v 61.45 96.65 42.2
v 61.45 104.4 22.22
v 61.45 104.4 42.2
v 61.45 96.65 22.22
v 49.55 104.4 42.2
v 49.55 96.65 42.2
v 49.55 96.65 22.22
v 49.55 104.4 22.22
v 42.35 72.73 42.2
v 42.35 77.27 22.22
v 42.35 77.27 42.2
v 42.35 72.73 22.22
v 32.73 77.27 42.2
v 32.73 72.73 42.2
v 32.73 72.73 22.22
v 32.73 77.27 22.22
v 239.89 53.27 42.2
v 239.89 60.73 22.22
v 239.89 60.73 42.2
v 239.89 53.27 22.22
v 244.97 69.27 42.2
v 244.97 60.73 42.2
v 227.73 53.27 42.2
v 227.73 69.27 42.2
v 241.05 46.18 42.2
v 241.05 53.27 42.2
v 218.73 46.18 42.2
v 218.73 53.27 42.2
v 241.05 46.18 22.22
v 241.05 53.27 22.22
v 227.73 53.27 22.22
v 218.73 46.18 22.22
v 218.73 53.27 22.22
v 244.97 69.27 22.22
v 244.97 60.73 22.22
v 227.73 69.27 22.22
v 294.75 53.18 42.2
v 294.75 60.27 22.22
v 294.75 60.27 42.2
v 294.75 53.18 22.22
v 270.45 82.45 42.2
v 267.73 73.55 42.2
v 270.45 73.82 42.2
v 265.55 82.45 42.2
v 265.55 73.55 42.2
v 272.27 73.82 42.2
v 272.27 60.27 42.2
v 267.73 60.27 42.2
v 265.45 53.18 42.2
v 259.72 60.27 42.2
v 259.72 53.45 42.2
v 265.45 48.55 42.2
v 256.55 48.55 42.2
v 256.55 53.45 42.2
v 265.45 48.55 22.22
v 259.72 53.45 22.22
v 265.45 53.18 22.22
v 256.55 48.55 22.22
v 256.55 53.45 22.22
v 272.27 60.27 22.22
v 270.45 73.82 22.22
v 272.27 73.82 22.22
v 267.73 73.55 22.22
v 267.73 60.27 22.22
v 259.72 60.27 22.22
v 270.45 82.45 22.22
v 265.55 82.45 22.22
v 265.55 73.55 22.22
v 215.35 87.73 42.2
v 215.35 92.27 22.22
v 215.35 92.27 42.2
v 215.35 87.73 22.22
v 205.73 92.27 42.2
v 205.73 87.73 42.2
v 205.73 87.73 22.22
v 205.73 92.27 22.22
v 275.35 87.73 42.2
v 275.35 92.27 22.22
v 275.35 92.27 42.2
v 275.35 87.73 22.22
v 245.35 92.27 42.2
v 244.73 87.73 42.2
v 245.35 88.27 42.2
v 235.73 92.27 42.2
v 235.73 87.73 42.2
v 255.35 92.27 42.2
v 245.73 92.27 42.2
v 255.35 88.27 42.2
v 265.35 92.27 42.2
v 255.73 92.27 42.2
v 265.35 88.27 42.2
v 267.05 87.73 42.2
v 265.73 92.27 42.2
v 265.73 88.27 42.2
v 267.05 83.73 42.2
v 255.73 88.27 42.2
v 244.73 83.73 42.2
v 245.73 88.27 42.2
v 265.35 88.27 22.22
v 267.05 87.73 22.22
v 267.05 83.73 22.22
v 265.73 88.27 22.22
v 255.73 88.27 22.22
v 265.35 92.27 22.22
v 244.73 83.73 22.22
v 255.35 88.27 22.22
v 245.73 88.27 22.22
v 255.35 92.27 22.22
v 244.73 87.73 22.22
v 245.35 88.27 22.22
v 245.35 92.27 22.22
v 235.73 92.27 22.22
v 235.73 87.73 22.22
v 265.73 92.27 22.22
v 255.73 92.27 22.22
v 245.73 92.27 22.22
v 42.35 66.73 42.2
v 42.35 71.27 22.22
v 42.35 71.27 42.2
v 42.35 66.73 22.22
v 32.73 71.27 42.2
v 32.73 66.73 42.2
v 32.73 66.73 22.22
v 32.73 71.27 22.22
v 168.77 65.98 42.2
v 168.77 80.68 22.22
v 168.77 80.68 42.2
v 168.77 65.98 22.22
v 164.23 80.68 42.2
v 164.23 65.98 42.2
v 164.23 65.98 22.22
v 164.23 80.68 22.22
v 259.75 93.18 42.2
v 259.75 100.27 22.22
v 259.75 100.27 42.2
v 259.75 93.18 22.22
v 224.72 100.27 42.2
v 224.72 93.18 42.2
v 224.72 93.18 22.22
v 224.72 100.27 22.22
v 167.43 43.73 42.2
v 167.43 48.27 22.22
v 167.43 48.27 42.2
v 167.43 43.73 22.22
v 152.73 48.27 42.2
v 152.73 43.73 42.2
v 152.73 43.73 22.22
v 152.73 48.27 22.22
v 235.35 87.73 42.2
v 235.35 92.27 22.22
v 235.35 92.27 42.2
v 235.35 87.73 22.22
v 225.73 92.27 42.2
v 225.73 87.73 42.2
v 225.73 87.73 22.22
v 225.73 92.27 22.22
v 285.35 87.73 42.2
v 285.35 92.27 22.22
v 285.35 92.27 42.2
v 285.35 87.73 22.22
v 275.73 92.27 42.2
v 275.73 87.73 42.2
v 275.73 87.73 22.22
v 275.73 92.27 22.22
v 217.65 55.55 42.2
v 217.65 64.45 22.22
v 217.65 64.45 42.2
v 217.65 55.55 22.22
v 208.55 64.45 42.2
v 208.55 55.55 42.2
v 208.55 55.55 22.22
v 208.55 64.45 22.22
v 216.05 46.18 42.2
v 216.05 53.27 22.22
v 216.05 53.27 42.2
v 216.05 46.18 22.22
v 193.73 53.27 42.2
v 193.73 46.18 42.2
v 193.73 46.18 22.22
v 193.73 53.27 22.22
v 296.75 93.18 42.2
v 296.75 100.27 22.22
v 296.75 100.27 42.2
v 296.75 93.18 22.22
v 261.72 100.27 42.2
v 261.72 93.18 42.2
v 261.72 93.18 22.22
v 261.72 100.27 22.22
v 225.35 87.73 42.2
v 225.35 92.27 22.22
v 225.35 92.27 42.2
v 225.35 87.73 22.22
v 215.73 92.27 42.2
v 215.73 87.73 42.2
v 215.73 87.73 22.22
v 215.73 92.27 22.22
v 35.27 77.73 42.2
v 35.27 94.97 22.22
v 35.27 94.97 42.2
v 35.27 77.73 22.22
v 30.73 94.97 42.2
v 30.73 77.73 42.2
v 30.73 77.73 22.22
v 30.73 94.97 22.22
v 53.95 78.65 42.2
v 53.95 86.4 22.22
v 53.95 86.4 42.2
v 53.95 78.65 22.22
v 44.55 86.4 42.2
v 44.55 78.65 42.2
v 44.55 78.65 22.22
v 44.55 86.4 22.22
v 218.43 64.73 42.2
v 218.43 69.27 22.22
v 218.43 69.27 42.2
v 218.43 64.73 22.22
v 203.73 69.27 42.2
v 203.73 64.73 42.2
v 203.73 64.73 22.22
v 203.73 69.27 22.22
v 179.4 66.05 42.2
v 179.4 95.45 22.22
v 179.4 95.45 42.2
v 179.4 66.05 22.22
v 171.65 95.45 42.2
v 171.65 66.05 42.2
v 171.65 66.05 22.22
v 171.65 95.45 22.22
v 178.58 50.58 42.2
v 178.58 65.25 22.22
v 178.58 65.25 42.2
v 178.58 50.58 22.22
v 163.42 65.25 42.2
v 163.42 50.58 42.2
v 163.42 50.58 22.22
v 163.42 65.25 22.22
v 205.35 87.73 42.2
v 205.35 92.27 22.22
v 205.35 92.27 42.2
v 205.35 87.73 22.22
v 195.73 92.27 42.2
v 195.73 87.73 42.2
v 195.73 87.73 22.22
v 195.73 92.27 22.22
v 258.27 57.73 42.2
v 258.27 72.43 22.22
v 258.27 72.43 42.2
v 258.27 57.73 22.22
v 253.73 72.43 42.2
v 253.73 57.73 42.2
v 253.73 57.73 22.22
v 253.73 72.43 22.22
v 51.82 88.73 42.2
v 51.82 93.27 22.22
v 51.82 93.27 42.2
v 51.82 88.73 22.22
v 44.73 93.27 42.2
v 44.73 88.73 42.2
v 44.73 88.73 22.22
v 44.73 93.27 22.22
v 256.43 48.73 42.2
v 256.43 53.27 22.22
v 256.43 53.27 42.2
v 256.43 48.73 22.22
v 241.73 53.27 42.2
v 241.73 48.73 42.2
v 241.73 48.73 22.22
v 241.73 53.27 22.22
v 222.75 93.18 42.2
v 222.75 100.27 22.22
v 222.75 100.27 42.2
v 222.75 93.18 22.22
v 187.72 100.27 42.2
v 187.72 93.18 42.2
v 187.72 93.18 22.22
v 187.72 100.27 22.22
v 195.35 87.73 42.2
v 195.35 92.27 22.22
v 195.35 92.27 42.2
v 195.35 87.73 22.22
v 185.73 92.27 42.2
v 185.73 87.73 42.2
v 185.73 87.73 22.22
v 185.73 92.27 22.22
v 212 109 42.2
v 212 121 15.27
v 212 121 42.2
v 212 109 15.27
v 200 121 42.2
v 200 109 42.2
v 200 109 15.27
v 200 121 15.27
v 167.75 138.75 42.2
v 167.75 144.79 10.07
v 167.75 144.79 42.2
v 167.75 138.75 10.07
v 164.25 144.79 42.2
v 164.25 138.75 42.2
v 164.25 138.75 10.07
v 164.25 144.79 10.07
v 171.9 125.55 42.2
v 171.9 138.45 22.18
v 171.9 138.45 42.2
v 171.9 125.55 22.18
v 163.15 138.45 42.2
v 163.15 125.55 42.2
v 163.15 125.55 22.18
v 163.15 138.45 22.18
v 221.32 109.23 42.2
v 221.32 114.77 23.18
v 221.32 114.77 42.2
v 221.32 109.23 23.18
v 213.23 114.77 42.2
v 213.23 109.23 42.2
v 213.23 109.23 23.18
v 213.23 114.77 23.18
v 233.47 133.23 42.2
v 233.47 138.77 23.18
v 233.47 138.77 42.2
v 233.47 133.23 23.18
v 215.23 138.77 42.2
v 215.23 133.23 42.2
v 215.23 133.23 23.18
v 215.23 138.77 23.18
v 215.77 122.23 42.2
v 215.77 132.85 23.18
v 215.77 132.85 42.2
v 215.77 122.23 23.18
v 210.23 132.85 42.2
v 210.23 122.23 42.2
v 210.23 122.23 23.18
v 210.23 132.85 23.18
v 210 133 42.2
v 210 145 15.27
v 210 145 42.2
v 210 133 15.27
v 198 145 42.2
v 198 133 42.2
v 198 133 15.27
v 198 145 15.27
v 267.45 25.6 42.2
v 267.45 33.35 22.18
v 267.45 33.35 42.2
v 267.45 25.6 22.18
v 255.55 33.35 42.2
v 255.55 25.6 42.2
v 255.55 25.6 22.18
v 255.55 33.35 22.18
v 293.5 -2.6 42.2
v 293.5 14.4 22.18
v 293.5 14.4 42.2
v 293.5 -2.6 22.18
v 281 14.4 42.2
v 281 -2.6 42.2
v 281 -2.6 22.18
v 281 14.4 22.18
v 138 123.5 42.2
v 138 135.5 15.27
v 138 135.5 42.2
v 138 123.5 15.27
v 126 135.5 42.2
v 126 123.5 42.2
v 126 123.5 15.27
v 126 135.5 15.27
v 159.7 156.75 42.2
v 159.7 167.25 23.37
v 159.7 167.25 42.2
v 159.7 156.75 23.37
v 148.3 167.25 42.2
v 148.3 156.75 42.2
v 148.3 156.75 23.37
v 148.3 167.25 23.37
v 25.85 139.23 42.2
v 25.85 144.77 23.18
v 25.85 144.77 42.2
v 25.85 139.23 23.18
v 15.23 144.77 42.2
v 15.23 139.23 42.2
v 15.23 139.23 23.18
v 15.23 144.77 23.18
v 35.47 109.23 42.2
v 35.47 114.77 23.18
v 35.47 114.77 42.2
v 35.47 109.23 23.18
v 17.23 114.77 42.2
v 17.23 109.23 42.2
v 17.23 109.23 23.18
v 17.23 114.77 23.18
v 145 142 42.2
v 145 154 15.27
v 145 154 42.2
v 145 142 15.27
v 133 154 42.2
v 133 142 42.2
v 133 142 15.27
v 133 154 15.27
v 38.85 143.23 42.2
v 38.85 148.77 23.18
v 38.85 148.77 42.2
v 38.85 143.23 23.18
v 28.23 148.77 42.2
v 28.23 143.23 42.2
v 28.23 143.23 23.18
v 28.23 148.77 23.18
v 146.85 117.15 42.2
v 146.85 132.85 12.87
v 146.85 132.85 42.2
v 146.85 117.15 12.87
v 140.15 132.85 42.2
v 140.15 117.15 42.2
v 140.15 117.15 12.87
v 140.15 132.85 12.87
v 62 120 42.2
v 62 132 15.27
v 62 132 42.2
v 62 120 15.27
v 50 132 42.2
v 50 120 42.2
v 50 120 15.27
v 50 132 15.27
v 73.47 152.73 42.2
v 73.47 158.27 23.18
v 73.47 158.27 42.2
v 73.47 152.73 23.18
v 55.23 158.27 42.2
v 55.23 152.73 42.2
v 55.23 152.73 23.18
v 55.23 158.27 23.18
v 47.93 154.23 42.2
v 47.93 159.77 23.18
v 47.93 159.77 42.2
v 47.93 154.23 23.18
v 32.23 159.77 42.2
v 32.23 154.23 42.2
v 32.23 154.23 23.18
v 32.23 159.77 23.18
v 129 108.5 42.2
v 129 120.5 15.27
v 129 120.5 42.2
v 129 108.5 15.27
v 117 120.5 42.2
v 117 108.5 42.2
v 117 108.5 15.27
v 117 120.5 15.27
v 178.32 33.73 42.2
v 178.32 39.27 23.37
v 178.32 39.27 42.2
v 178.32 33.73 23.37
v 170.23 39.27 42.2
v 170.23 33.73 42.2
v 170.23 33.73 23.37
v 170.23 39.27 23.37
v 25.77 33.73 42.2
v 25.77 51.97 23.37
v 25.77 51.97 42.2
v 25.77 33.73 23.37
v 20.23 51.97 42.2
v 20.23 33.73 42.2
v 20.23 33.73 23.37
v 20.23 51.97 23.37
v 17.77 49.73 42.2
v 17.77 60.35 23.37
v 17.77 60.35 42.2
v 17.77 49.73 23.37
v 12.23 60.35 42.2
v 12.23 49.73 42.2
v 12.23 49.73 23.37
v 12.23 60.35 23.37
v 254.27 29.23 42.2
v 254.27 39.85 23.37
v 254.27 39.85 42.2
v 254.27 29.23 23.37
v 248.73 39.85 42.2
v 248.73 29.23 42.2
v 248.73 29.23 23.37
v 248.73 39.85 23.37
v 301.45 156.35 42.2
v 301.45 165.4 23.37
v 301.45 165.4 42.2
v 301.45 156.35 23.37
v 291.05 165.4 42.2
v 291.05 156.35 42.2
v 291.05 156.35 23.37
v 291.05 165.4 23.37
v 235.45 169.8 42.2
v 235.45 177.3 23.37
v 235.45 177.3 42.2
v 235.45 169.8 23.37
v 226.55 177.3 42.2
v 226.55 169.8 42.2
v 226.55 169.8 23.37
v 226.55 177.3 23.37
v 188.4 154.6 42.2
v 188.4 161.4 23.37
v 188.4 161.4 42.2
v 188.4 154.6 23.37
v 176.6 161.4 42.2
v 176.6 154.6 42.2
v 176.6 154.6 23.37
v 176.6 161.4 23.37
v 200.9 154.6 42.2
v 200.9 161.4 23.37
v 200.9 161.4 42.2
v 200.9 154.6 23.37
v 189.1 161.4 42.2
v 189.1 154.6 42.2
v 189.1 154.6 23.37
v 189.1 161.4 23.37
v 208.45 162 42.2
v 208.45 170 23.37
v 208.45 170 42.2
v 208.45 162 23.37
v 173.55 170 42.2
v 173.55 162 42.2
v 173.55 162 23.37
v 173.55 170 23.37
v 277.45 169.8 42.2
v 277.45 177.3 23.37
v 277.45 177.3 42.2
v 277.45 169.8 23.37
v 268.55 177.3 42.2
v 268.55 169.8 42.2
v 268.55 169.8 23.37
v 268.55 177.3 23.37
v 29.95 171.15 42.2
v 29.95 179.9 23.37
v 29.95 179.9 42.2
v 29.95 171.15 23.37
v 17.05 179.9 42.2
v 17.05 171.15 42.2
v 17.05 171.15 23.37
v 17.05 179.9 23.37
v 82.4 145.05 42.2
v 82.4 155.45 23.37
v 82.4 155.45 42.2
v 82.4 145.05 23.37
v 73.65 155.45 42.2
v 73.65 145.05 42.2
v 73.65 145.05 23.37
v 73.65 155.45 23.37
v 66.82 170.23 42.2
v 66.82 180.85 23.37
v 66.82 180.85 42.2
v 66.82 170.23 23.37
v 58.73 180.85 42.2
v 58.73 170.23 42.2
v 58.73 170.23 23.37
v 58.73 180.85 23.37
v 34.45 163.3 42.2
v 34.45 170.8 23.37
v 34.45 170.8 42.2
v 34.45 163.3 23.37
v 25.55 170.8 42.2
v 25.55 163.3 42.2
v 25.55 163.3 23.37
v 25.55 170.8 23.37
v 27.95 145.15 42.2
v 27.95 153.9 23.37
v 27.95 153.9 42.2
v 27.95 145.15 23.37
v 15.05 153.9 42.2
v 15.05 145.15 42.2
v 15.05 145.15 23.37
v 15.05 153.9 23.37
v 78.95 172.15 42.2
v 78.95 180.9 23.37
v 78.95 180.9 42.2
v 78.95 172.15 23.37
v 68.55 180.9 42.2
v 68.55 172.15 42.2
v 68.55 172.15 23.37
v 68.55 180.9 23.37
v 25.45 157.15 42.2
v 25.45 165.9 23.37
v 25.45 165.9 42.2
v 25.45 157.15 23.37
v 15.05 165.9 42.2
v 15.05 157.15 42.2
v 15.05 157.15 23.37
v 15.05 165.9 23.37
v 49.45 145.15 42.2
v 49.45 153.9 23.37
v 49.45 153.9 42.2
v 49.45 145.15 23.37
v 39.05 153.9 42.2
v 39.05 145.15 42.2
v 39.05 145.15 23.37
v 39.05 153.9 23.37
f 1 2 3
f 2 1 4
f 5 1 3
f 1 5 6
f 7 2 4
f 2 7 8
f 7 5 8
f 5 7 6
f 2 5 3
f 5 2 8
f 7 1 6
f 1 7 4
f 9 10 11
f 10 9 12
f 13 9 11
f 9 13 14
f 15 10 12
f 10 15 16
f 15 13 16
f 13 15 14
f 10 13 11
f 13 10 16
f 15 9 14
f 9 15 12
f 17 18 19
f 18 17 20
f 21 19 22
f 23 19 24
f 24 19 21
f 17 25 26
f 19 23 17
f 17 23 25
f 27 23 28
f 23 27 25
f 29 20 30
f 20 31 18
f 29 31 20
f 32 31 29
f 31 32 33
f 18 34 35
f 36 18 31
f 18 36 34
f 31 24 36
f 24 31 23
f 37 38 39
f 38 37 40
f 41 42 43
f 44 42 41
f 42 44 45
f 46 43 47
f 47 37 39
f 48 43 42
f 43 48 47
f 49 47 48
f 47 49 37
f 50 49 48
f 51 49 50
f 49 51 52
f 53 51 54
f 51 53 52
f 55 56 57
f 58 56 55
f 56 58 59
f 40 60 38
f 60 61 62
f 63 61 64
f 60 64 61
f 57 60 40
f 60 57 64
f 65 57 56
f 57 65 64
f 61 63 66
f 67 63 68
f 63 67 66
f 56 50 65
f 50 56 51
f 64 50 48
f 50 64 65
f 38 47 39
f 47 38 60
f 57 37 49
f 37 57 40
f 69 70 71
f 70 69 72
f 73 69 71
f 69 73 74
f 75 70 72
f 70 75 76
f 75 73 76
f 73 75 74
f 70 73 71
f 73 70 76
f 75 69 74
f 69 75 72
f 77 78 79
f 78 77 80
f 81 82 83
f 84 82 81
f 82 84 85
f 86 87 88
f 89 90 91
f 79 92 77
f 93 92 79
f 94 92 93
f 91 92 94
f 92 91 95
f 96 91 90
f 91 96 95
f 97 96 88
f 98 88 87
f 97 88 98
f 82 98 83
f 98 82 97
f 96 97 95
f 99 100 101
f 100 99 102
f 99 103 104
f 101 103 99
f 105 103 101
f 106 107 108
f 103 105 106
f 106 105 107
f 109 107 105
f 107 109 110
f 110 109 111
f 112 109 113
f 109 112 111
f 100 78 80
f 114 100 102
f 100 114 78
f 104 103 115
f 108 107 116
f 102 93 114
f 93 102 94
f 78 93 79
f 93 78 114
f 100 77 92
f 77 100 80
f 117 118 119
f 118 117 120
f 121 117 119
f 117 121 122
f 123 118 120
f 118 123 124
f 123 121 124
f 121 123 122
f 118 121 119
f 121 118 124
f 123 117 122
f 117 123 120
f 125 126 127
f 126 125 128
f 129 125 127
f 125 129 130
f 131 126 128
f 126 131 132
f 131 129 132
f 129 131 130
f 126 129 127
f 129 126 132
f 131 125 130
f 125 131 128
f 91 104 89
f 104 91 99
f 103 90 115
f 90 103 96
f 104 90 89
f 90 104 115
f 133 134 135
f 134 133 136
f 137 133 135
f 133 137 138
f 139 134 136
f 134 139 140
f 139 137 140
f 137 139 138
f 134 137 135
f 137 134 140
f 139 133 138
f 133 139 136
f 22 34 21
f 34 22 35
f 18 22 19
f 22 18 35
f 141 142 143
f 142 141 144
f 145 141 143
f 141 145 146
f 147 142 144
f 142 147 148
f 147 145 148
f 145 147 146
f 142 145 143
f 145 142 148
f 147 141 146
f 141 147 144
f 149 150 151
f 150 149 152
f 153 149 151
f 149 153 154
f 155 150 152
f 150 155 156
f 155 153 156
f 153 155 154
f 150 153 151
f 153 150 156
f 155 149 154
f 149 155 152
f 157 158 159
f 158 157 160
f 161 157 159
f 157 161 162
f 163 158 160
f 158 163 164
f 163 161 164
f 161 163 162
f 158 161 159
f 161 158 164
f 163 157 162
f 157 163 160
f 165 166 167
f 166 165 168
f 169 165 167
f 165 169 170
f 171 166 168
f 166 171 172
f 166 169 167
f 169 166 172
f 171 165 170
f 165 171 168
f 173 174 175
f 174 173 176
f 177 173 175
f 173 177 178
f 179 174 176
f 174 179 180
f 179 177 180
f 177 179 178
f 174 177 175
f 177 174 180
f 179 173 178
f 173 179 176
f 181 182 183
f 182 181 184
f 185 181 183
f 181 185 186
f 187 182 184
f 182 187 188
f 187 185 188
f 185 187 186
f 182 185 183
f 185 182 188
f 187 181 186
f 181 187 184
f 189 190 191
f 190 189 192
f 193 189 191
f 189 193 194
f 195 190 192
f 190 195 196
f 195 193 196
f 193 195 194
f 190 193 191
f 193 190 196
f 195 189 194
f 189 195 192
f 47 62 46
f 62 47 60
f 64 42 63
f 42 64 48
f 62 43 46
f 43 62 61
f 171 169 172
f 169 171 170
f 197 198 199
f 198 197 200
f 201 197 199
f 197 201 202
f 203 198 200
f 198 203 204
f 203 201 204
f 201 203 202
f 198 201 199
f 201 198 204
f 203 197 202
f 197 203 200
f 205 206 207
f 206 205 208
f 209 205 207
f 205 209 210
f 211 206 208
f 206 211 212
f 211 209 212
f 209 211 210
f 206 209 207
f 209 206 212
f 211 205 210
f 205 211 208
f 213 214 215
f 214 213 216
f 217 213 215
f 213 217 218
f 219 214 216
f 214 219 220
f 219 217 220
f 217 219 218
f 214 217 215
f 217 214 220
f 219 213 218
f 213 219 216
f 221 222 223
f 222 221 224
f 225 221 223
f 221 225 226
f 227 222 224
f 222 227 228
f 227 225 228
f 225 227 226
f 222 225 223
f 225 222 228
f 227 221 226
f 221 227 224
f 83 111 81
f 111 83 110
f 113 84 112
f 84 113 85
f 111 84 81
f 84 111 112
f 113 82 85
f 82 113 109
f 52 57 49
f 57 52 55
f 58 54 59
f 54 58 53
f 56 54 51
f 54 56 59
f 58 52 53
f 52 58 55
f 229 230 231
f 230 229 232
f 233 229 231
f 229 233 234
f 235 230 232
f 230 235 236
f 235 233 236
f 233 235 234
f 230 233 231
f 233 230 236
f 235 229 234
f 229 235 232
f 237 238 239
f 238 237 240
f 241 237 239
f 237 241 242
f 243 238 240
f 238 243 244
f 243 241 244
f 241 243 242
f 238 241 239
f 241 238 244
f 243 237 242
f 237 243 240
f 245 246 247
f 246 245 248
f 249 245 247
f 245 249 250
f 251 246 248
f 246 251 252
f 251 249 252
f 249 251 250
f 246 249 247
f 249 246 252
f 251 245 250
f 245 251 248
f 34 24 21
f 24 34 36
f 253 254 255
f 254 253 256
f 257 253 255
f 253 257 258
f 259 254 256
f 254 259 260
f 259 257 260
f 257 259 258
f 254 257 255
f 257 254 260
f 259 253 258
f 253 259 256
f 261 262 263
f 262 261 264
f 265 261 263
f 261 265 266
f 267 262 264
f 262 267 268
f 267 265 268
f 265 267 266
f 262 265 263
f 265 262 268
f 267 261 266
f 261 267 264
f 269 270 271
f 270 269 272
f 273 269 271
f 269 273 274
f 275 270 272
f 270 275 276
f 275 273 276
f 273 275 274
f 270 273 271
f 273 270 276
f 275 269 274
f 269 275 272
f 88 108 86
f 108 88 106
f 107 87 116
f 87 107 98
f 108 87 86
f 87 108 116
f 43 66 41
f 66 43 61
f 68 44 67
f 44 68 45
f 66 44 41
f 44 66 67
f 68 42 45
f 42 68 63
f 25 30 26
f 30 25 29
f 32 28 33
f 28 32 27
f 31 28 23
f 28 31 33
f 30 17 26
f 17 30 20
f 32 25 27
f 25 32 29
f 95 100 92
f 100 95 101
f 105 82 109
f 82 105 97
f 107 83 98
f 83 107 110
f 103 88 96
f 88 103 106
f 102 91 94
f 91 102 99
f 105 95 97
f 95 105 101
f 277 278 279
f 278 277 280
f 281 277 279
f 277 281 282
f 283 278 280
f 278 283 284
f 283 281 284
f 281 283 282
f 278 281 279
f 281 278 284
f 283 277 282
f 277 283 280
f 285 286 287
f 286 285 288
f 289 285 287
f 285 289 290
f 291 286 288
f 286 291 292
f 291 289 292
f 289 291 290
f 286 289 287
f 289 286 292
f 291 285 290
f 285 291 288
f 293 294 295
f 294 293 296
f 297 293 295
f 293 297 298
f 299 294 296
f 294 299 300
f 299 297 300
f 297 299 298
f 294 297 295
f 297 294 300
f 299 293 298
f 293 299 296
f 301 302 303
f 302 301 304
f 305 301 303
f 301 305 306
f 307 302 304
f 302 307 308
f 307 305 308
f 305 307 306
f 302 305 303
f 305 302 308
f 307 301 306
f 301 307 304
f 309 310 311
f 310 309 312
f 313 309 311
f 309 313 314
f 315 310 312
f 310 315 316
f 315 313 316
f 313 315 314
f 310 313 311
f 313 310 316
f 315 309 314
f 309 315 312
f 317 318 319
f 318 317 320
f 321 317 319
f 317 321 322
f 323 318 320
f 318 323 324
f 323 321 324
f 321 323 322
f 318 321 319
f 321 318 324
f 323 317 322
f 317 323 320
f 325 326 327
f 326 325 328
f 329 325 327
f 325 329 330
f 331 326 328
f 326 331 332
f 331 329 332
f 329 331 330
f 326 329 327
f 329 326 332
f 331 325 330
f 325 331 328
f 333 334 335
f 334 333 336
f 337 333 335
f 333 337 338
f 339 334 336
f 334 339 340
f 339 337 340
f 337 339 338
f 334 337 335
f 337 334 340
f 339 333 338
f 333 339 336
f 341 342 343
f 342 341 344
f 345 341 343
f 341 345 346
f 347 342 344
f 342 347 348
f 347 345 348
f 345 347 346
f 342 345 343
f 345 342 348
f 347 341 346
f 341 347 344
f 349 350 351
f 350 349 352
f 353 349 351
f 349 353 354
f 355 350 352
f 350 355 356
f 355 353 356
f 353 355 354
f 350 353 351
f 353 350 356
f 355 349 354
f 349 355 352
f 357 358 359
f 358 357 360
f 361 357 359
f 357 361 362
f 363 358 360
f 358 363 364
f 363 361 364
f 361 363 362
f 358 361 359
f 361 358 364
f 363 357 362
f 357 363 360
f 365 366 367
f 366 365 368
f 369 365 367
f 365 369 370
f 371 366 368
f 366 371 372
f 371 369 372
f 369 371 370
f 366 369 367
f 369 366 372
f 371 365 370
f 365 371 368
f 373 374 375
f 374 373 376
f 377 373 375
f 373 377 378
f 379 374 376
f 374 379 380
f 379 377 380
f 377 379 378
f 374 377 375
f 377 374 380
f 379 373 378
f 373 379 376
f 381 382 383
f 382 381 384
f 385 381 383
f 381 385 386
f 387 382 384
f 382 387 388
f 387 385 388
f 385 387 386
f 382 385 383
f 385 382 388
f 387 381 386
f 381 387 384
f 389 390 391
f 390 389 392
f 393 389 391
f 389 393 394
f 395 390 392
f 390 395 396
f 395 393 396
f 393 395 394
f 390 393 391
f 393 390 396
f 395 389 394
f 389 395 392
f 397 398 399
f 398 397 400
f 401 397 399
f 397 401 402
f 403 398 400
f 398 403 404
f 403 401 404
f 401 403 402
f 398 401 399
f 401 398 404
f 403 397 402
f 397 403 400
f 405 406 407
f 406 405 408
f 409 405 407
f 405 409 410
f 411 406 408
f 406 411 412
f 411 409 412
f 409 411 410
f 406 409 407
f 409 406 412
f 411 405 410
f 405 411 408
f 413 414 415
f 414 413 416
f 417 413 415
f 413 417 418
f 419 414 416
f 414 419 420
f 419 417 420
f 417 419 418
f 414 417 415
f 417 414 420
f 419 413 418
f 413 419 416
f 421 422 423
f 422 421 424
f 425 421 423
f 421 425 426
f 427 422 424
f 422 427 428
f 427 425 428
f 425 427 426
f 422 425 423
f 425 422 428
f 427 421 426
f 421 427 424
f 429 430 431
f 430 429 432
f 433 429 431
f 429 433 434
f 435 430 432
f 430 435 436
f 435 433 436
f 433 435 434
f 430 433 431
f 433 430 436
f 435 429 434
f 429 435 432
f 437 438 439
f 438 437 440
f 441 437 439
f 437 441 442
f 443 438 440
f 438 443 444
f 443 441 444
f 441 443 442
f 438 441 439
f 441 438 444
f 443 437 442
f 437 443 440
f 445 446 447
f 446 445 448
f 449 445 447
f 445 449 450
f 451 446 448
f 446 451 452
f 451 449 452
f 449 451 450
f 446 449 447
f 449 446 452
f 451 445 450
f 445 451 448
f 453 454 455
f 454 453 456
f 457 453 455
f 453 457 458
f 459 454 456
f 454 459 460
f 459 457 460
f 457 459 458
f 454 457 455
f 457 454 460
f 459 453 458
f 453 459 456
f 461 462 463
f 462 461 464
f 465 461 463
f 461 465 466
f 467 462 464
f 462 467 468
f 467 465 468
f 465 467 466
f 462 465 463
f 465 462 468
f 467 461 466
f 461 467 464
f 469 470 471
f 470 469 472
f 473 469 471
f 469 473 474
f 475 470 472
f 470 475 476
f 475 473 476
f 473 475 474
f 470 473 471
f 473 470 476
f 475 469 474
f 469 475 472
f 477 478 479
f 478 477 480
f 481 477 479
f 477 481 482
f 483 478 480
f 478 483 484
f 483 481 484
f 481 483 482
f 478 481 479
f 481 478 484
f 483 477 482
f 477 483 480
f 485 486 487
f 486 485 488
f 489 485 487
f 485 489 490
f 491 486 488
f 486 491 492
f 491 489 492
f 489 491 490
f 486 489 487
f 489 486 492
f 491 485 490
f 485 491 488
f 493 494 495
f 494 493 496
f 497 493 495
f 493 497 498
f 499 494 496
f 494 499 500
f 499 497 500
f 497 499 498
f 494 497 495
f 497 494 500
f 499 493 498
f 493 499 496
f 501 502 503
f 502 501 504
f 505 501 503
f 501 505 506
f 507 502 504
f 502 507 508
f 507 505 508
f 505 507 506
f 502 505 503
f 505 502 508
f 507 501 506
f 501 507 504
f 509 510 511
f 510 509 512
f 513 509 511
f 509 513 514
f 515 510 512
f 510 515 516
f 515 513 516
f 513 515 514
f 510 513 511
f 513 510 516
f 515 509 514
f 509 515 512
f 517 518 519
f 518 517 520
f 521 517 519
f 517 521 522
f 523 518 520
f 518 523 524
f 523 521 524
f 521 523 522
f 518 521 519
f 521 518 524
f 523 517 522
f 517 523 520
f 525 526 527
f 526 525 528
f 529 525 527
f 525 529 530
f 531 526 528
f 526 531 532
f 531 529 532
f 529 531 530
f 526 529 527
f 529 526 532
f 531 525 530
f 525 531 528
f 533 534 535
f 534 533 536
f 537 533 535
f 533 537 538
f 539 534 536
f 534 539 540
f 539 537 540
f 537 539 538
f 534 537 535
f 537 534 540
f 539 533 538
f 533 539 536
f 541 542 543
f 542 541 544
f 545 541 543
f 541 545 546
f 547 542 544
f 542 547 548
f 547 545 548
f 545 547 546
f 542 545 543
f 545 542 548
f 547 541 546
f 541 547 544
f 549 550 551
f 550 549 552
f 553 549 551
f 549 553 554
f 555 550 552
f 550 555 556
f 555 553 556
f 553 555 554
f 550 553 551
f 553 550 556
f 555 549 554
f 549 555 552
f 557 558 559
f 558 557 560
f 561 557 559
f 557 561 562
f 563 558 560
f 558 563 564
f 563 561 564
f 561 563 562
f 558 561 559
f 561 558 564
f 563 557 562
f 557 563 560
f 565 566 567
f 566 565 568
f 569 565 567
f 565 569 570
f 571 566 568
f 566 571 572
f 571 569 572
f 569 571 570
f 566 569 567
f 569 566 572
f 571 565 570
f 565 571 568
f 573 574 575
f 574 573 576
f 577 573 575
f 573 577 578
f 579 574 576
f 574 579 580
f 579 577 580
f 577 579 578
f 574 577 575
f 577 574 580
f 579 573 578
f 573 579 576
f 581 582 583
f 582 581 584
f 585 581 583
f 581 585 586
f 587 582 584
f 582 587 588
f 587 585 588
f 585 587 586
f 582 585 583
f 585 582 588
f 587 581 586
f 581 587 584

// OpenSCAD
// Diagnostic volumes only. Not printable parts or approved cable mates.
part="service";
module box(b){translate([b[0],b[1],b[2]])cube([b[3]-b[0],b[4]-b[1],b[5]-b[2]]);}
service_boxes=[[49.55, 96.65, 22.220000000000002, 61.45, 104.4, 42.2], [32.73, 72.73, 22.220000000000002, 42.35, 77.27000000000001, 42.2], [227.73, 52.73, 22.220000000000002, 239.89, 57.27, 42.2], [259.72, 53.18, 22.220000000000002, 294.75, 60.27, 42.2], [205.73, 87.72999999999999, 22.220000000000002, 215.35, 92.27000000000001, 42.2], [265.73, 87.72999999999999, 22.220000000000002, 275.35, 92.27000000000001, 42.2], [32.73, 66.73, 22.220000000000002, 42.35, 71.27, 42.2], [164.23, 65.98, 22.220000000000002, 168.77, 80.68, 42.2], [255.73000000000002, 87.72999999999999, 22.220000000000002, 265.35, 92.27000000000001, 42.2], [224.72, 93.18, 22.220000000000002, 259.75, 100.27000000000001, 42.2], [227.73, 60.73, 22.220000000000002, 244.97, 65.27, 42.2], [152.73, 43.73, 22.220000000000002, 167.43, 48.27, 42.2], [225.73, 87.72999999999999, 22.220000000000002, 235.35, 92.27000000000001, 42.2], [275.73, 87.72999999999999, 22.220000000000002, 285.35, 92.27000000000001, 42.2], [212.75, 55.55, 22.220000000000002, 217.64999999999998, 64.45, 42.2], [193.73, 46.18, 22.220000000000002, 216.05, 53.27, 42.2], [261.72, 93.18, 22.220000000000002, 296.75, 100.27000000000001, 42.2], [215.73, 87.72999999999999, 22.220000000000002, 225.35, 92.27000000000001, 42.2], [267.73, 66.73, 22.220000000000002, 272.27, 73.82, 42.2], [208.55, 55.55, 22.220000000000002, 213.45, 64.45, 42.2], [30.73, 77.72999999999999, 22.220000000000002, 35.27, 94.97, 42.2], [44.55, 78.65, 22.220000000000002, 53.95, 86.4, 42.2], [203.73, 64.73, 22.220000000000002, 218.43, 69.27, 42.2], [267.73, 60.18, 22.220000000000002, 272.27, 67.27, 42.2], [171.65, 66.05, 22.220000000000002, 179.4, 95.45, 42.2], [235.73, 87.72999999999999, 22.220000000000002, 245.35, 92.27000000000001, 42.2], [256.55, 48.55, 22.220000000000002, 265.45, 53.45, 42.2], [163.42, 50.58, 22.220000000000002, 178.58, 65.25, 42.2], [195.73, 87.72999999999999, 22.220000000000002, 205.35, 92.27000000000001, 42.2], [253.73, 57.73, 22.220000000000002, 258.27, 72.43, 42.2], [227.73, 64.73, 22.220000000000002, 244.97, 69.27, 42.2], [44.73, 88.72999999999999, 22.220000000000002, 51.82, 93.27000000000001, 42.2], [241.73, 48.73, 22.220000000000002, 256.43, 53.27, 42.2], [187.72, 93.18, 22.220000000000002, 222.75, 100.27000000000001, 42.2], [245.73, 87.72999999999999, 22.220000000000002, 255.35, 92.27000000000001, 42.2], [227.73, 56.73, 22.220000000000002, 239.89, 61.27, 42.2], [265.55, 73.55, 22.220000000000002, 270.45, 82.45, 42.2], [218.73, 46.18, 22.220000000000002, 241.05, 53.27, 42.2], [244.73, 83.72999999999999, 22.220000000000002, 267.05, 88.27000000000001, 42.2], [185.73, 87.72999999999999, 22.220000000000002, 195.35, 92.27000000000001, 42.2], [200.0, 109.0, 15.27, 212.0, 121.0, 42.2], [164.25, 138.75, 10.069999999999999, 167.75, 144.79, 42.2], [163.15, 125.55, 22.180000000000003, 171.9, 138.45, 42.2], [213.23, 109.23, 23.180000000000003, 221.32, 114.77, 42.2], [215.23, 133.23000000000002, 23.180000000000003, 233.47, 138.77, 42.2], [210.23, 122.22999999999999, 23.180000000000003, 215.77, 132.85, 42.2], [198.0, 133.0, 15.27, 210.0, 145.0, 42.2], [255.55, 25.599999999999994, 22.180000000000003, 267.45, 33.35, 42.2], [281.0, -2.600000000000003, 22.180000000000003, 293.5, 14.4, 42.2], [126.0, 123.5, 15.27, 138.0, 135.5, 42.2], [148.3, 156.75, 23.37, 159.7, 167.25, 42.2], [15.230000000000004, 139.23, 23.180000000000003, 25.849999999999994, 144.77, 42.2], [17.230000000000004, 109.23, 23.180000000000003, 35.47, 114.77, 42.2], [133.0, 142.0, 15.27, 145.0, 154.0, 42.2], [28.230000000000004, 143.23, 23.180000000000003, 38.849999999999994, 148.77, 42.2], [140.15, 117.15, 12.87, 146.85, 132.85, 42.2], [50.0, 120.0, 15.27, 62.0, 132.0, 42.2], [55.22999999999999, 152.73, 23.180000000000003, 73.47, 158.27, 42.2], [32.230000000000004, 154.23, 23.180000000000003, 47.93000000000001, 159.77, 42.2], [117.0, 108.5, 15.27, 129.0, 120.5, 42.2], [170.23, 33.730000000000004, 23.37, 178.32, 39.269999999999996, 42.2], [20.23, 33.730000000000004, 23.37, 25.77, 51.97, 42.2], [12.23, 49.73, 23.37, 17.77, 60.35, 42.2], [248.73000000000002, 29.23, 23.37, 254.26999999999998, 39.85, 42.2], [291.05, 156.35, 23.37, 301.45, 165.4, 42.2], [226.55, 169.8, 23.37, 235.45, 177.3, 42.2], [176.6, 154.6, 23.37, 188.4, 161.4, 42.2], [189.1, 154.6, 23.37, 200.9, 161.4, 42.2], [173.55, 162.0, 23.37, 208.45, 170.0, 42.2], [268.55, 169.8, 23.37, 277.45, 177.3, 42.2], [17.05, 171.15, 23.37, 29.95, 179.9, 42.2], [73.65, 145.05, 23.37, 82.4, 155.45, 42.2], [58.73, 170.23, 23.37, 66.82, 180.85, 42.2], [25.55, 163.3, 23.37, 34.45, 170.8, 42.2], [15.05, 145.15, 23.37, 27.95, 153.9, 42.2], [68.55, 172.15, 23.37, 78.95, 180.9, 42.2], [15.05, 157.15, 23.37, 25.45, 165.9, 42.2], [39.05, 145.15, 23.37, 49.45, 153.9, 42.2]];
fan_boxes=[[73.3, 39.5, 11.3, 114.8, 81.0, 22.8], [75.3, 39.5, 11.3, 116.8, 81.0, 22.8], [75.3, 41.5, 11.3, 116.8, 83.0, 22.8], [75.3, 43.5, 11.3, 116.8, 85.0, 22.8], [75.3, 45.5, 11.3, 116.8, 87.0, 22.8], [75.3, 47.5, 11.3, 116.8, 89.0, 22.8], [75.3, 49.5, 11.3, 116.8, 91.0, 22.8], [75.3, 51.5, 11.3, 116.8, 93.0, 22.8], [75.3, 53.5, 11.3, 116.8, 95.0, 22.8], [73.3, 29.5, 13.3, 114.8, 71.0, 24.8], [75.3, 29.5, 13.3, 116.8, 71.0, 24.8], [73.3, 31.5, 13.3, 114.8, 73.0, 24.8], [75.3, 31.5, 13.3, 116.8, 73.0, 24.8], [73.3, 33.5, 13.3, 114.8, 75.0, 24.8], [75.3, 33.5, 13.3, 116.8, 75.0, 24.8], [73.3, 35.5, 13.3, 114.8, 77.0, 24.8], [75.3, 35.5, 13.3, 116.8, 77.0, 24.8], [73.3, 37.5, 13.3, 114.8, 79.0, 24.8], [75.3, 37.5, 13.3, 116.8, 79.0, 24.8], [73.3, 39.5, 13.3, 114.8, 81.0, 24.8]];
if(part=="service")for(b=service_boxes)box(b);
if(part=="fan_candidates")for(b=fan_boxes)box(b);
